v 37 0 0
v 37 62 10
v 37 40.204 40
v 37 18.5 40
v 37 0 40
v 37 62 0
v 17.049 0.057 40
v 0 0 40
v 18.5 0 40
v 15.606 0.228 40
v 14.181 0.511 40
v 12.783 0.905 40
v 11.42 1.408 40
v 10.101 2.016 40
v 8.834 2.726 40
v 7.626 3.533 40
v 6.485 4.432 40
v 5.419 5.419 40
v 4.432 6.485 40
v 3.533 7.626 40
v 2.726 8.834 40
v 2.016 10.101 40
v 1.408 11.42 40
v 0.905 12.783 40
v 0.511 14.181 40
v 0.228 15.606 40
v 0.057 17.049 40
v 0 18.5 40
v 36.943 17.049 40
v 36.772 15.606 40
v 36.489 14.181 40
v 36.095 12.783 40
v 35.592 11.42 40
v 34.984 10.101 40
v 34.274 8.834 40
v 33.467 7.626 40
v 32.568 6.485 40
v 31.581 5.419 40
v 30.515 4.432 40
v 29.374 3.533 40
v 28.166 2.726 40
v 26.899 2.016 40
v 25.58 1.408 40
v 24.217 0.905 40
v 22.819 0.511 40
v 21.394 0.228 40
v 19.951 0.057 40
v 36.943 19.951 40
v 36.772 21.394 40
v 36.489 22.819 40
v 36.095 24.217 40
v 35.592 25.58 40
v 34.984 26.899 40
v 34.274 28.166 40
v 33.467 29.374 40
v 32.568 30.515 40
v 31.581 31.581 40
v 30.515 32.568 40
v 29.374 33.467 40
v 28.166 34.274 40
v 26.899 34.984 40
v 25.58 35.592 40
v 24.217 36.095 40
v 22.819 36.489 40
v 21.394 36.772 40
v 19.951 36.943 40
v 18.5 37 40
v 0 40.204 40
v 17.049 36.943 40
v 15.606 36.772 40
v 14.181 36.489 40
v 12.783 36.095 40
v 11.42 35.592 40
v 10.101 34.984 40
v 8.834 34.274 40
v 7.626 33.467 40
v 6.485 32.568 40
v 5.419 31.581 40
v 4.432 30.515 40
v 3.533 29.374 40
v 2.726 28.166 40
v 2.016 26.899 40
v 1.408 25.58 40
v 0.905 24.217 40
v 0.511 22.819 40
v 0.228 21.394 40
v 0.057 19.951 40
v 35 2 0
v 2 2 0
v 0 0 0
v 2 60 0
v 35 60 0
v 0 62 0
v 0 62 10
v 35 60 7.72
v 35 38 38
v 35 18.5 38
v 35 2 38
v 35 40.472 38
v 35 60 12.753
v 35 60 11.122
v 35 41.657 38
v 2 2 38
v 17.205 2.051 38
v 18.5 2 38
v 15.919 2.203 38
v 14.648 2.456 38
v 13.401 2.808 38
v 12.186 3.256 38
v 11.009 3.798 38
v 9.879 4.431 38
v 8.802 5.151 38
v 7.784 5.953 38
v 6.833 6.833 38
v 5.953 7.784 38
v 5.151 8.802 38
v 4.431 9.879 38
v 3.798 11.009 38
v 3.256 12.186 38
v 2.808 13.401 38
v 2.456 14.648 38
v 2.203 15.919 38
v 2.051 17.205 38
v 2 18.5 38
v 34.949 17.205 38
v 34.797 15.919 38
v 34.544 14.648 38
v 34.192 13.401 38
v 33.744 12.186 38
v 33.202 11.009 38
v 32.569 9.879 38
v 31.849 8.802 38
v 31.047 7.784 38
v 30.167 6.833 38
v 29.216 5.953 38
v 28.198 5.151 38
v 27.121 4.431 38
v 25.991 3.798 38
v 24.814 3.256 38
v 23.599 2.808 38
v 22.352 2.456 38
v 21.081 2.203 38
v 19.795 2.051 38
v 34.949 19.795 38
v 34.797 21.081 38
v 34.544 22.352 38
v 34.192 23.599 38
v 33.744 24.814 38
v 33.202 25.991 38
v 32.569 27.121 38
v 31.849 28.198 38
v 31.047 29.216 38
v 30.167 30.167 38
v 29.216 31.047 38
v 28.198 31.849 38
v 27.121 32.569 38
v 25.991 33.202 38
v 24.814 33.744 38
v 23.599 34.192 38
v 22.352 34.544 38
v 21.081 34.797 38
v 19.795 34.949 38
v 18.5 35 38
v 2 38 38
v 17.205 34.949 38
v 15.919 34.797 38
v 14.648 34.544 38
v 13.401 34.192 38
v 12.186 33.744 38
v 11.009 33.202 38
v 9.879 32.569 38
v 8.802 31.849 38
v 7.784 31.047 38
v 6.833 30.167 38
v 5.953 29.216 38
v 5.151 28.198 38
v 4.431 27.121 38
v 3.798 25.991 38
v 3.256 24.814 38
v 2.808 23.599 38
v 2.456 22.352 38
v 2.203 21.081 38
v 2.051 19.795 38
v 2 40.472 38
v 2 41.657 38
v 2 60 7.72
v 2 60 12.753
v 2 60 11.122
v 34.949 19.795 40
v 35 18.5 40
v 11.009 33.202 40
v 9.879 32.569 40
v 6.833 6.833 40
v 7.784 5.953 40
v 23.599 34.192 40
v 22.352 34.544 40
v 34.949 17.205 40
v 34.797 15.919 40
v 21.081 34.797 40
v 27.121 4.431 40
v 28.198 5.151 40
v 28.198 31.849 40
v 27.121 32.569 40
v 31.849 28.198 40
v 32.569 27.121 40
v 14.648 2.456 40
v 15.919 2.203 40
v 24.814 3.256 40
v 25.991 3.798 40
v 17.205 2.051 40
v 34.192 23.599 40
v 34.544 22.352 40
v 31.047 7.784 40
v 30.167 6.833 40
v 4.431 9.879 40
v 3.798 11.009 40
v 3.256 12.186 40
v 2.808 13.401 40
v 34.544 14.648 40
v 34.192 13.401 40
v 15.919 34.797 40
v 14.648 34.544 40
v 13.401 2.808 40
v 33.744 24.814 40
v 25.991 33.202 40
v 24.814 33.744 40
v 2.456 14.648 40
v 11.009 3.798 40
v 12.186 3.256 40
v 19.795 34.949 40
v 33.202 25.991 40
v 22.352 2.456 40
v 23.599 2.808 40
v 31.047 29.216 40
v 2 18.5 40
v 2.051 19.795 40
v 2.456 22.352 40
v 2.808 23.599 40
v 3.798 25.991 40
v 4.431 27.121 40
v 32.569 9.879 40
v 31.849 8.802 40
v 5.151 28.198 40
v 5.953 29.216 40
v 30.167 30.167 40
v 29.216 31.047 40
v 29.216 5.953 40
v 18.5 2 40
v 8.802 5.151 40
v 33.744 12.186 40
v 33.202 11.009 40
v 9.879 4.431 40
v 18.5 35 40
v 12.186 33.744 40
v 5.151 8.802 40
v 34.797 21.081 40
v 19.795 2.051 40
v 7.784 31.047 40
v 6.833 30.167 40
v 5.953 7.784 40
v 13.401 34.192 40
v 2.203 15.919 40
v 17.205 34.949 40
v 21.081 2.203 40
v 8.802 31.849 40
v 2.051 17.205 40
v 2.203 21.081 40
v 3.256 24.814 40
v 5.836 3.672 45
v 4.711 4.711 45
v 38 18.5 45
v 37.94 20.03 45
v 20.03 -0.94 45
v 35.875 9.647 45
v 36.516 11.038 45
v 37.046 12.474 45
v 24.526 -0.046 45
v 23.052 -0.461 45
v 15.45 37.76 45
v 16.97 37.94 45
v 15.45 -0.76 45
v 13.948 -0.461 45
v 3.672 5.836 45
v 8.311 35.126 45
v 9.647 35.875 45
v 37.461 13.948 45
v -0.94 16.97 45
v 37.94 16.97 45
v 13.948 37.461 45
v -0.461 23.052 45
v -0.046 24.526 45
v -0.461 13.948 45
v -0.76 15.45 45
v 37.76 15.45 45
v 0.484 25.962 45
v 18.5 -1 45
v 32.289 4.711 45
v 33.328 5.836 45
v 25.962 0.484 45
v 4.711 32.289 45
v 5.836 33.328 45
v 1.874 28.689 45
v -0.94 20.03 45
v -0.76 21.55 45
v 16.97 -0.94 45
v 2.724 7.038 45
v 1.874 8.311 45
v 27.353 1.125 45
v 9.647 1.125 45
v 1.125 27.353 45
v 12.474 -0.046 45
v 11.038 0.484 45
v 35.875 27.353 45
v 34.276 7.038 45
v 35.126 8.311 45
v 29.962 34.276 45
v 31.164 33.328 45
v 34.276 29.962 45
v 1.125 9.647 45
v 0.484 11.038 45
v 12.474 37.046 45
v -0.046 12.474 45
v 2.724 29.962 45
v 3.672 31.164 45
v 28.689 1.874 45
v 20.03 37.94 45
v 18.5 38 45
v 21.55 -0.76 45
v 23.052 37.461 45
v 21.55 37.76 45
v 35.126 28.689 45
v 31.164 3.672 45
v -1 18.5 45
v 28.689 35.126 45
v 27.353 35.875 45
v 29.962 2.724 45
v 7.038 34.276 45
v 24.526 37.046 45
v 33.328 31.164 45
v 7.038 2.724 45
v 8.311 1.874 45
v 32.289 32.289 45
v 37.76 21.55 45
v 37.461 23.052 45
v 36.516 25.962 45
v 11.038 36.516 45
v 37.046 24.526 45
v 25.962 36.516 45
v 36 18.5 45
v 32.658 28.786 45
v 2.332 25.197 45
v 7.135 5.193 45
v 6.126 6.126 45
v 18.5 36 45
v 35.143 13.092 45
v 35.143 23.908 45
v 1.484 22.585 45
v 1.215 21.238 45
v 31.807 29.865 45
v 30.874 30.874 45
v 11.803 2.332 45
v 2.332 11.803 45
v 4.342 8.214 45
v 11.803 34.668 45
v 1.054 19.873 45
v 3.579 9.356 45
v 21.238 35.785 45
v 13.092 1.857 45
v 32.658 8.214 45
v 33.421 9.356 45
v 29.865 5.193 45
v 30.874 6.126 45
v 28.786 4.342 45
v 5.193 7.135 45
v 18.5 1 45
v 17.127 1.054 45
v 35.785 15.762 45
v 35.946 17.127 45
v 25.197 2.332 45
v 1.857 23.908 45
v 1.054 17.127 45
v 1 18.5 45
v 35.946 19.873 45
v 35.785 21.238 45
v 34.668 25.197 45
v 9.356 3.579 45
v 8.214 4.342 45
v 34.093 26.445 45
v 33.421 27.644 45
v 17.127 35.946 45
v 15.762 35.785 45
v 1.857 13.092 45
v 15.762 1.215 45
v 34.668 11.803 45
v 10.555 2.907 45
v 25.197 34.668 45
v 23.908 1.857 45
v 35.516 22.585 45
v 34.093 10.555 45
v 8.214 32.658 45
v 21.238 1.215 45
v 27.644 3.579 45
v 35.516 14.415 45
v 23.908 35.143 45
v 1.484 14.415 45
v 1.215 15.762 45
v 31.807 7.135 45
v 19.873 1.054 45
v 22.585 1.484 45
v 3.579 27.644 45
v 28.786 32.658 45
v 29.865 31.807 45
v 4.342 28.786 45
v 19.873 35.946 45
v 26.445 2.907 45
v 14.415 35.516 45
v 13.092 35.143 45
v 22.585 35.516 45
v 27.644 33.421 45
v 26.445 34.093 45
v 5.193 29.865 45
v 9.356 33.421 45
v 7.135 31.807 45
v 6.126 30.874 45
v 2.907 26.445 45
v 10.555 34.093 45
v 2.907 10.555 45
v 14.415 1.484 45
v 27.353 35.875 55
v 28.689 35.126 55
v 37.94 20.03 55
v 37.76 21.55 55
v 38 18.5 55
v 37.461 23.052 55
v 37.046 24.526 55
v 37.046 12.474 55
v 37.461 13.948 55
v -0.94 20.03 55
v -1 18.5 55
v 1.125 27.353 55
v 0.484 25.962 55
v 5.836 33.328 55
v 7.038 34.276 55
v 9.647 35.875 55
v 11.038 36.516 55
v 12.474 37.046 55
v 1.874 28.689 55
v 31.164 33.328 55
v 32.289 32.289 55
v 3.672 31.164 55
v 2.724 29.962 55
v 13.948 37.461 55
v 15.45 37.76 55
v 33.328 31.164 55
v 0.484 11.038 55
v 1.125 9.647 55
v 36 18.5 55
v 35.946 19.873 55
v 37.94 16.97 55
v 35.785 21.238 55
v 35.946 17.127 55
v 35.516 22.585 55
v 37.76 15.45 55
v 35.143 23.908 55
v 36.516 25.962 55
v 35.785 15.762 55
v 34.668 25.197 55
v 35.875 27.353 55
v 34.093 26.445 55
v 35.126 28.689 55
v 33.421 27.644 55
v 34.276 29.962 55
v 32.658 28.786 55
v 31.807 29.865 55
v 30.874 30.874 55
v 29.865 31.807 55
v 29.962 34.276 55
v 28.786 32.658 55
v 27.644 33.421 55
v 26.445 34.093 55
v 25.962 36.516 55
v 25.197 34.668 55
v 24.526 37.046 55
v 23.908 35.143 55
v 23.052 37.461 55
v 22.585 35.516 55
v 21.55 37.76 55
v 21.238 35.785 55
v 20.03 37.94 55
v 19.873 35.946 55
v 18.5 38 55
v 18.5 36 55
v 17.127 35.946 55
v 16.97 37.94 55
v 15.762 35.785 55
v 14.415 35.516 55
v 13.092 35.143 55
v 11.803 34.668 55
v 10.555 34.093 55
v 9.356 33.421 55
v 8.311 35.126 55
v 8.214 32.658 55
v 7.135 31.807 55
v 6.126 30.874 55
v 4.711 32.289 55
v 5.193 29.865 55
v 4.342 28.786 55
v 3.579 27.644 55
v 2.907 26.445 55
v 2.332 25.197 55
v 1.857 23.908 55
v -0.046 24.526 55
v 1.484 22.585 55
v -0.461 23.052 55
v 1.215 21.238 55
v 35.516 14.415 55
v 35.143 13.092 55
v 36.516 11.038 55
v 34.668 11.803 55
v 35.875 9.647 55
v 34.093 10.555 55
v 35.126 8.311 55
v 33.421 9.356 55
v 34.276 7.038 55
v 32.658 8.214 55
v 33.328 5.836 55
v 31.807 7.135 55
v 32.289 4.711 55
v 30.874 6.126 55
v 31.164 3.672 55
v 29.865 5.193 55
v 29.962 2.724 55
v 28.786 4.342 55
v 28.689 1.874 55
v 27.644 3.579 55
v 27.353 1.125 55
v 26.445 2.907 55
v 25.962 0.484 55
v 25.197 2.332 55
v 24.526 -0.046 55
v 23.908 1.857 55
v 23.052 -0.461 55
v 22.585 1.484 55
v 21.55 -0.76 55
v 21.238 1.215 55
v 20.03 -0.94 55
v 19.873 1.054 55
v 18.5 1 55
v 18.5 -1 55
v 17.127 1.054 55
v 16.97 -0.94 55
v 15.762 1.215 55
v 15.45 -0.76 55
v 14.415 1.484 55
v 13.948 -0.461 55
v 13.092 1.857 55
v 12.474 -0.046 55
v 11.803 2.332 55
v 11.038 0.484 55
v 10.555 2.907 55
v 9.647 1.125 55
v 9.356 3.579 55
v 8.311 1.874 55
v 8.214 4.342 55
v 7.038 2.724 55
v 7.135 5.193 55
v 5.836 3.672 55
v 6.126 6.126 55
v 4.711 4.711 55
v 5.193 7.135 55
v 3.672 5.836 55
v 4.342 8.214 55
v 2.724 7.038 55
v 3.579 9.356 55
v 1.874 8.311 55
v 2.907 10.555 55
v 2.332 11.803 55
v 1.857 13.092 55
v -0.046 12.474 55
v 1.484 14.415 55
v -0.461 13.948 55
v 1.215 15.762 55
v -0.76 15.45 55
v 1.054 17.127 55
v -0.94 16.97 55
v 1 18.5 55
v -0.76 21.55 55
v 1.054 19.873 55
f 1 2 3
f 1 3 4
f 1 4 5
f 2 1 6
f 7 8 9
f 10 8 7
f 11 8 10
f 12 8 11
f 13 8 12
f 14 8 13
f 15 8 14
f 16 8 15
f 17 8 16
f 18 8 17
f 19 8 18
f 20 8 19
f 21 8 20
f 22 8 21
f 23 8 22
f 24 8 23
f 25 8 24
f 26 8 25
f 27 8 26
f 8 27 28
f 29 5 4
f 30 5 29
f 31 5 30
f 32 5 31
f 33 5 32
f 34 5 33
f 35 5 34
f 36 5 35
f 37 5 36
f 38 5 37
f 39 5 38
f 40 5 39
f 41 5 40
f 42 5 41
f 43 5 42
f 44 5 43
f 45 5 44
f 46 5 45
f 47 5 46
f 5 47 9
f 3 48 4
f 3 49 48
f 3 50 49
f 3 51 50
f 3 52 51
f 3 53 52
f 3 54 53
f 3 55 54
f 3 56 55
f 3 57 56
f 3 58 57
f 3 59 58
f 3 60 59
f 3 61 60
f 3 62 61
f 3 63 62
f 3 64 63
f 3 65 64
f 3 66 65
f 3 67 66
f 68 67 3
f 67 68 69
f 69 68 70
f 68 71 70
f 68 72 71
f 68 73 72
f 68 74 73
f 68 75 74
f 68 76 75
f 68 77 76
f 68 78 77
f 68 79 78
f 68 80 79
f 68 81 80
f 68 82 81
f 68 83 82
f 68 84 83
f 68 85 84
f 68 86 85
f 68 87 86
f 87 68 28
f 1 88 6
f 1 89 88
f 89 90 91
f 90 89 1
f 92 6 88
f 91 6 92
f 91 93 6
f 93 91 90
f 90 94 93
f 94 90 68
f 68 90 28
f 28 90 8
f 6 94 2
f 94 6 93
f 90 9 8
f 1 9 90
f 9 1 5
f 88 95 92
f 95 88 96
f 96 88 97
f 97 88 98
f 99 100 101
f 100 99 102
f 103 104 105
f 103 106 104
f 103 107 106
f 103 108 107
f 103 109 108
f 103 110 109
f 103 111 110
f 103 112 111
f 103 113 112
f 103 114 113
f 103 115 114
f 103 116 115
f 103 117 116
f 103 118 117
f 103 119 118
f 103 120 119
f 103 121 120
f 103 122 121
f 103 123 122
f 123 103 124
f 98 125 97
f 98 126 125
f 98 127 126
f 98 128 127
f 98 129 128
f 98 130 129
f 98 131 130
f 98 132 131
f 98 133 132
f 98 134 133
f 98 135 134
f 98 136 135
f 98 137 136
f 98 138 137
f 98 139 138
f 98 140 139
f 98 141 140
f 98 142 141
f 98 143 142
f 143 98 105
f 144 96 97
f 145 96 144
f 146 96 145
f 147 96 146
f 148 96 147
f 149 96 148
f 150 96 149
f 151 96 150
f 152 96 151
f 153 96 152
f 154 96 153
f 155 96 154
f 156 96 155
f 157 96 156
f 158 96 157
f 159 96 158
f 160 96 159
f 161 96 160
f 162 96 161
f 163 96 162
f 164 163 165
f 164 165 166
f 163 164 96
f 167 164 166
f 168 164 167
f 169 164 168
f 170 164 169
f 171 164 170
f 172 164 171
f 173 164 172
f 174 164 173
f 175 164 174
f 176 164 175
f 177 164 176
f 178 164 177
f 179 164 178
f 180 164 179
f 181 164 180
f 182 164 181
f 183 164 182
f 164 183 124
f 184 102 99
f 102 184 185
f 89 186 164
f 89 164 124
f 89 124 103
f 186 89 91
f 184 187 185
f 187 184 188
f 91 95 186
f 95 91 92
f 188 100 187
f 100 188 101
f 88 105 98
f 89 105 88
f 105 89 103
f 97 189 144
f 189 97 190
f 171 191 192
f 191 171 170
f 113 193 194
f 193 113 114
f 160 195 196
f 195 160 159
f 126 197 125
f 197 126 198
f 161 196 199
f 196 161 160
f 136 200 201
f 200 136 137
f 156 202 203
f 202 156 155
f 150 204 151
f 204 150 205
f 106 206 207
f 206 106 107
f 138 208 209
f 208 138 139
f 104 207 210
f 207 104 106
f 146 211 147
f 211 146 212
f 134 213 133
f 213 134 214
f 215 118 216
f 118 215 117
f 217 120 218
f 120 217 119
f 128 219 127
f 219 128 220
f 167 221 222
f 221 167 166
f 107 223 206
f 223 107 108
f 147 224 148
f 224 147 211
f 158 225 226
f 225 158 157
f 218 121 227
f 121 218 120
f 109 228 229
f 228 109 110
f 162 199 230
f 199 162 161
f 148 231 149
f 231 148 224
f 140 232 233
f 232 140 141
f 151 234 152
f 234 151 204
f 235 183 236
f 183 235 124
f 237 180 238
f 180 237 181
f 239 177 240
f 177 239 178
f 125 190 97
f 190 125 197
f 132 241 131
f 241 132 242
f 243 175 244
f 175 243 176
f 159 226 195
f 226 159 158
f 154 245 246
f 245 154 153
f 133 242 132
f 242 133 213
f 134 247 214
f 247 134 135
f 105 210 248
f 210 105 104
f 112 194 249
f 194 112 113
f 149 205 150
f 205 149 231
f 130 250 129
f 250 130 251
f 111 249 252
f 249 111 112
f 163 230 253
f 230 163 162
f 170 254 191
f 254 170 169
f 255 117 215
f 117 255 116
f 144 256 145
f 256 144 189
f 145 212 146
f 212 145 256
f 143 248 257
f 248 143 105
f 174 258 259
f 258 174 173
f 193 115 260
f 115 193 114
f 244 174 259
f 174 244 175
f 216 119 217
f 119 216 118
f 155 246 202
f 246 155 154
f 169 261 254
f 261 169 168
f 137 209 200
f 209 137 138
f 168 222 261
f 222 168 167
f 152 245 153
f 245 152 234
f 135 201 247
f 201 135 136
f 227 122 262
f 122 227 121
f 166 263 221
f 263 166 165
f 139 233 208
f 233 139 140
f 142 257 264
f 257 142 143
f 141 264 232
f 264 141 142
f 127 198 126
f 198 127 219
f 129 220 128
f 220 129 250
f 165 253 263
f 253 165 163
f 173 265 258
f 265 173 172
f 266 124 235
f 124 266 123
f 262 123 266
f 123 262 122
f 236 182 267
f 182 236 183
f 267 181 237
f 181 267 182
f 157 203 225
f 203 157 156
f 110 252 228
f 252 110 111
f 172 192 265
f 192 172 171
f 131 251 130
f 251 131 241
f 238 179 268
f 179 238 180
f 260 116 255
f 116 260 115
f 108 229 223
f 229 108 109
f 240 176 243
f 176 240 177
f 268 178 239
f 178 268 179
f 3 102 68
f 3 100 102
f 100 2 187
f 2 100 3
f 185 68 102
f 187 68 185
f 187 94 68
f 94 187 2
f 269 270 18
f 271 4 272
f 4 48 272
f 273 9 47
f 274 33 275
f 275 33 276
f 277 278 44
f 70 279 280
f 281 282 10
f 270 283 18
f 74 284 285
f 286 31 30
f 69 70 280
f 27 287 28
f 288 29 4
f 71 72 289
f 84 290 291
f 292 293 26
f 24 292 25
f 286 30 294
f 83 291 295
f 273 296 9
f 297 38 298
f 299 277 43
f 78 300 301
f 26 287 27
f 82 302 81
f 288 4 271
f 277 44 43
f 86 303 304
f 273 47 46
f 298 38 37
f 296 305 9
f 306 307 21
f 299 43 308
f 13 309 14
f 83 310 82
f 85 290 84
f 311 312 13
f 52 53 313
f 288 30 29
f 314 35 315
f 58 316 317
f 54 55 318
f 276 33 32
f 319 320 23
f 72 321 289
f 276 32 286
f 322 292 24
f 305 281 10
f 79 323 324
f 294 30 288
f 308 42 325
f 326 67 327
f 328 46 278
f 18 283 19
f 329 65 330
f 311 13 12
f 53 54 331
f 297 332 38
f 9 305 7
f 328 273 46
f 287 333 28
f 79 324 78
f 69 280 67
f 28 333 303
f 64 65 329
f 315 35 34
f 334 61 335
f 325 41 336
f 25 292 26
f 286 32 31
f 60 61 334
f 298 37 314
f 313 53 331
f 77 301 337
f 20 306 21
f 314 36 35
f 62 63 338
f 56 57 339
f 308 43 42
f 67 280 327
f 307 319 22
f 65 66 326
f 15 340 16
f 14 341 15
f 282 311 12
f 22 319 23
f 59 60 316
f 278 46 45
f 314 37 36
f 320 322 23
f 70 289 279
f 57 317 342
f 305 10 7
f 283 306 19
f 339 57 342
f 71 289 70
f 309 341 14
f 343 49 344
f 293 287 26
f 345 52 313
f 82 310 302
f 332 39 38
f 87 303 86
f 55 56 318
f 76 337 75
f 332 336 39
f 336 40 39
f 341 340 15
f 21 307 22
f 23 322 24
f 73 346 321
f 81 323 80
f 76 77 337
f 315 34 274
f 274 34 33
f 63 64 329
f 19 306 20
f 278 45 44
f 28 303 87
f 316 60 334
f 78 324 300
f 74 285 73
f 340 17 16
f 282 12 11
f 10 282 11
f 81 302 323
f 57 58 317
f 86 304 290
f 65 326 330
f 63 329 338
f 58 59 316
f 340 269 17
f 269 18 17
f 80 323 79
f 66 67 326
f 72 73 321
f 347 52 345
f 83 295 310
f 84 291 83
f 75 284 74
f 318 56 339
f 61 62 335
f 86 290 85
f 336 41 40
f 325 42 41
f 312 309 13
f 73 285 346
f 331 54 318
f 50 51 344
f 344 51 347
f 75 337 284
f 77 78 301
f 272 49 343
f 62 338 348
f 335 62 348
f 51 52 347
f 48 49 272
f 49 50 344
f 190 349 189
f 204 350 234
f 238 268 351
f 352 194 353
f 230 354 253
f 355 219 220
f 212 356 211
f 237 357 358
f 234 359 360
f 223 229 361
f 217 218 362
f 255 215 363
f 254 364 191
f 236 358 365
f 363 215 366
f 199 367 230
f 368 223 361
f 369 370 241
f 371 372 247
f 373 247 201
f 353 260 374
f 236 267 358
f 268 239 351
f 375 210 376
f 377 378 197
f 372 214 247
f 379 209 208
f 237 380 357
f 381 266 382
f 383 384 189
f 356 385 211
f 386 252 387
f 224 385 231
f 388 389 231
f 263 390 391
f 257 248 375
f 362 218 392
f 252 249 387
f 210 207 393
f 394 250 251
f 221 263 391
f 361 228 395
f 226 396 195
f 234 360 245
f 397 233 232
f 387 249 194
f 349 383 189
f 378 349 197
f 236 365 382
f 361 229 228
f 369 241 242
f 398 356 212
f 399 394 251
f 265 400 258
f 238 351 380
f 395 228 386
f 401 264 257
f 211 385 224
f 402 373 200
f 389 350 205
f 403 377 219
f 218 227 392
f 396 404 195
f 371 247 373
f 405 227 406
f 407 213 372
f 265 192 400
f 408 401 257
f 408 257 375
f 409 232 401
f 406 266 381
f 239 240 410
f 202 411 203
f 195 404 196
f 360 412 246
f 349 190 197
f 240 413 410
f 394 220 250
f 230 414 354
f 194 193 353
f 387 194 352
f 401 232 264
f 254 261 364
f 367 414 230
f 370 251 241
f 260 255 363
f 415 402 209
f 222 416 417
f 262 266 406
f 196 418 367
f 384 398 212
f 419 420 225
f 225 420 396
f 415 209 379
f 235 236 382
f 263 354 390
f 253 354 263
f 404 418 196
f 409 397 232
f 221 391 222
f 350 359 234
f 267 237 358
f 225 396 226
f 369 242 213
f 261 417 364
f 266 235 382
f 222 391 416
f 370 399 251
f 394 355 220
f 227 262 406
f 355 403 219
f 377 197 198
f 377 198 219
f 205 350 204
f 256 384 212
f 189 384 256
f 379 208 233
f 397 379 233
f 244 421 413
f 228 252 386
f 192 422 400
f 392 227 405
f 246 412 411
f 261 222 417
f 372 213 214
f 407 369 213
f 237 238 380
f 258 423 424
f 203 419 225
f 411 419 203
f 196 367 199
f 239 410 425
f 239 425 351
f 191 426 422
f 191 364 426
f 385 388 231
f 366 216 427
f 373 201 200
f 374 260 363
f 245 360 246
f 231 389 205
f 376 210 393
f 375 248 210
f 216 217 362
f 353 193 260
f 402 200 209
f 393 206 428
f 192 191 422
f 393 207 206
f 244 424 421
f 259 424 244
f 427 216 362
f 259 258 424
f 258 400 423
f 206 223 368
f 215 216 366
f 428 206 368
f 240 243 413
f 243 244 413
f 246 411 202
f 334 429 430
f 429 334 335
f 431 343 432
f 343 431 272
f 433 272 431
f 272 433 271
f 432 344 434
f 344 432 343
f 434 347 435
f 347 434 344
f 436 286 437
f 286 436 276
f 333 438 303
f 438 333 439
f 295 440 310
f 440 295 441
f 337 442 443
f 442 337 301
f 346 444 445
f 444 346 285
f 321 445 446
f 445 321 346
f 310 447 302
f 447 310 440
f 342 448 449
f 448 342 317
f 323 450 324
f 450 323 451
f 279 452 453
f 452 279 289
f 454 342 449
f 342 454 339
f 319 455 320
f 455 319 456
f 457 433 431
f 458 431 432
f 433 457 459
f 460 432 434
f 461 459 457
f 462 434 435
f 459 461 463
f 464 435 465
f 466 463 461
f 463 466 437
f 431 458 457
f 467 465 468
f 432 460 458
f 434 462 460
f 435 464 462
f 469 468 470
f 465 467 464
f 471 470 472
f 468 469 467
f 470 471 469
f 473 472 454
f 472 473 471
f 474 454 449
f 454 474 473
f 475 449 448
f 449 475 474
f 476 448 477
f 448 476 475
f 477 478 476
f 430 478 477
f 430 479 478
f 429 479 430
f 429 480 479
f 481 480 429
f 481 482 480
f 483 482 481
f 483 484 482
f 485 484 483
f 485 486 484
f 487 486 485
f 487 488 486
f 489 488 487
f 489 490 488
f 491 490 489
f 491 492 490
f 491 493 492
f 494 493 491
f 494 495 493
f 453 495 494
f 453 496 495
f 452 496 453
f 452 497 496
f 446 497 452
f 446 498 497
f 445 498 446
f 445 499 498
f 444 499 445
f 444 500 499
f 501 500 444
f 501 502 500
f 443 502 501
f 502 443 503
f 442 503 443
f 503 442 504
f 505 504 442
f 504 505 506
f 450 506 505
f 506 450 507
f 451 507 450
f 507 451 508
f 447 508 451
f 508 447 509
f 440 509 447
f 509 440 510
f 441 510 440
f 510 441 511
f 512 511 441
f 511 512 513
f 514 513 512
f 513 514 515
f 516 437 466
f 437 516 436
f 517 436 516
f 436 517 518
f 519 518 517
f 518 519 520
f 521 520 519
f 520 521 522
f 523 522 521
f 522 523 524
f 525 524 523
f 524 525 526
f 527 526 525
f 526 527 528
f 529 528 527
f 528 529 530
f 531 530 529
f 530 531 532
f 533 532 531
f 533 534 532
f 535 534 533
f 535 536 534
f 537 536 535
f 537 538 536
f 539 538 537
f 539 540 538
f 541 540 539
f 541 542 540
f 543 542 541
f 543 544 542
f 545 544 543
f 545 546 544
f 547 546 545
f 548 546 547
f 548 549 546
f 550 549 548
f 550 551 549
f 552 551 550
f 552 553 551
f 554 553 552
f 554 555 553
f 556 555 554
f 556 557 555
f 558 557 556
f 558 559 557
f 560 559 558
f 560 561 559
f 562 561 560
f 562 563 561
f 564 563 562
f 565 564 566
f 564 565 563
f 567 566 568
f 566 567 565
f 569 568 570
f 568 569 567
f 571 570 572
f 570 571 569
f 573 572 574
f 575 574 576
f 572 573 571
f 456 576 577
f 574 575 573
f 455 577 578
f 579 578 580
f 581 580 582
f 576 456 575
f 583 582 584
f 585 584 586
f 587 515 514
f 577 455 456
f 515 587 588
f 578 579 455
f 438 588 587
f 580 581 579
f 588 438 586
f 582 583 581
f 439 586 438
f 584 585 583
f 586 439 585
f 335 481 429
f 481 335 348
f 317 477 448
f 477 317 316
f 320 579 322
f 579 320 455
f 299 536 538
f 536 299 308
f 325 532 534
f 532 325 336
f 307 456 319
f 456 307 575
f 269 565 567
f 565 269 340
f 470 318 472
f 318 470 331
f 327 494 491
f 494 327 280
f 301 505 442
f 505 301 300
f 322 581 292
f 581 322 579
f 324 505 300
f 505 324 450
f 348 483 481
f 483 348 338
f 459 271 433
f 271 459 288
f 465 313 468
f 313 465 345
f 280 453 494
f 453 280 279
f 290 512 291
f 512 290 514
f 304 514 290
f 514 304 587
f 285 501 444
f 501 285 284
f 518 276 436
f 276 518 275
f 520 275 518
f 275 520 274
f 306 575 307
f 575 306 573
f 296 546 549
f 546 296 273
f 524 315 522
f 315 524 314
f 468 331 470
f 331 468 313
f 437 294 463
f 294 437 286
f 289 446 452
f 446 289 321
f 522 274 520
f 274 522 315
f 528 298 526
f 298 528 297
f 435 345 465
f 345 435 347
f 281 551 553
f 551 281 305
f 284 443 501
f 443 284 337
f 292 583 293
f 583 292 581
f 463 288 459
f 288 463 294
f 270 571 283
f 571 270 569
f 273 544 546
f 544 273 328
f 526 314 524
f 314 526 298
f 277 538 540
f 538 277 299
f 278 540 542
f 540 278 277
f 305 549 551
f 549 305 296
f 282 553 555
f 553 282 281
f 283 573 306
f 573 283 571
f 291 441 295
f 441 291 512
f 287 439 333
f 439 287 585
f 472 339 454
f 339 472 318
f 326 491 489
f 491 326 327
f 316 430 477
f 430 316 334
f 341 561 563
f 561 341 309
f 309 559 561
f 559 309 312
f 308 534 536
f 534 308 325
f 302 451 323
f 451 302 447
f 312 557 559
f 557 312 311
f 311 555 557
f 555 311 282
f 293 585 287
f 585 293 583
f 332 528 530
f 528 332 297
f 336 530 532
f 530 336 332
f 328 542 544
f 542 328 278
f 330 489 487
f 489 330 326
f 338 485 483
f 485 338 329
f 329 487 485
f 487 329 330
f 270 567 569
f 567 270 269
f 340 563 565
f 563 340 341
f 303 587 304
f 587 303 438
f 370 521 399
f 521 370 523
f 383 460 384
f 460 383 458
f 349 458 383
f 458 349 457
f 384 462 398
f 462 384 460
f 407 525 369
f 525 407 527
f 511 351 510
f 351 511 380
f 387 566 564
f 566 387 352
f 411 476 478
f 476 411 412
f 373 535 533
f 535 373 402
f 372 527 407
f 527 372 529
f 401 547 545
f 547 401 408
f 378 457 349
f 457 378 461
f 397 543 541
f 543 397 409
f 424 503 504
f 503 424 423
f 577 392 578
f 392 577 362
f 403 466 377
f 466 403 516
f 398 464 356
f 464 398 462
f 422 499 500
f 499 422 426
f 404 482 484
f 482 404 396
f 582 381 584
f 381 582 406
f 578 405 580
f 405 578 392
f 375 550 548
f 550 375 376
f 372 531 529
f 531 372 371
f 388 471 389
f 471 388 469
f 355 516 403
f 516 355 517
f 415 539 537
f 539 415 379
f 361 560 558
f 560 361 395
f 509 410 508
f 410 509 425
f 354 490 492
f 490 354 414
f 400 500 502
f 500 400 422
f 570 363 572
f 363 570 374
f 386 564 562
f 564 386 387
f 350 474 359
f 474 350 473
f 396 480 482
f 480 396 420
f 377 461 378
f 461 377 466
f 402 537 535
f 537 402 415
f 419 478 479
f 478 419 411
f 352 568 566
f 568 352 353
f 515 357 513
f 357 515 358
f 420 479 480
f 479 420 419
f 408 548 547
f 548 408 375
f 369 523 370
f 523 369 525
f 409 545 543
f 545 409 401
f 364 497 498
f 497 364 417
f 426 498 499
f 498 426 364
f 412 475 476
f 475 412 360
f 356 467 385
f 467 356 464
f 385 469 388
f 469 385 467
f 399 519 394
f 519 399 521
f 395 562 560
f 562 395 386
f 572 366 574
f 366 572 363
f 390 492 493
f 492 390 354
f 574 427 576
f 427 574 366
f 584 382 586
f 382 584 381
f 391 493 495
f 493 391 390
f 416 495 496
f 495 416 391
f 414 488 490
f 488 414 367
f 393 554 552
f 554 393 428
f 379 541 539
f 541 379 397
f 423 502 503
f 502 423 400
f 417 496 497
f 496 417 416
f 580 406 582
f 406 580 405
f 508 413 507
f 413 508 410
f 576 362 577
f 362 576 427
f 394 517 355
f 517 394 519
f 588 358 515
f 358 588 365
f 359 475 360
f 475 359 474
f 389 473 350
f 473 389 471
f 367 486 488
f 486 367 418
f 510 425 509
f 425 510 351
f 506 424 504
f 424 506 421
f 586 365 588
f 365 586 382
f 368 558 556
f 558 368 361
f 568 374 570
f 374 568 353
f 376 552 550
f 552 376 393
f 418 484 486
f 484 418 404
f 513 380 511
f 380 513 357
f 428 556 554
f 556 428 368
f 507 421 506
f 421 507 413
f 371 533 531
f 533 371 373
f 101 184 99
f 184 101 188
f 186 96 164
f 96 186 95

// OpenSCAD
$fn=80;

x=37;
y=62;
z=40;

hmount=5;
Dwall=2;
Din=x-2*Dwall;
Dout=35;
Hconnect=10;



difference() {
cube(size = [x,y,z]);
translate([Dwall,Dwall,0]){
cube(size = [x-2*Dwall,y-2*Dwall,z-Dwall]);
}
translate([x/2,x/2,z-hmount]){
cylinder(hmount,d1=Din,d2=Din);
}
translate([0,y,10]){
rotate( [36,0,0], v = [x, y, z]) {
cube(size = [x,y,z]);
}
}
}

translate([0,38,z-Dwall]){
rotate( [306,0,0], v = [x, y, z]) {
cube(size = [x,38,Dwall]);
}
}


translate([x/2,x/2,z]){
difference() {
cylinder(hmount,d1=Din+2*Dwall,d2=Dout+2*Dwall);
cylinder(hmount,d1=Din,d2=Dout);
}
}

translate([x/2,x/2,z+hmount]){
difference() {
  cylinder(Hconnect,d1=Dout+2*Dwall,d2=Dout+2*Dwall);
cylinder(Hconnect,d1=Dout,d2=Dout);
}
}
